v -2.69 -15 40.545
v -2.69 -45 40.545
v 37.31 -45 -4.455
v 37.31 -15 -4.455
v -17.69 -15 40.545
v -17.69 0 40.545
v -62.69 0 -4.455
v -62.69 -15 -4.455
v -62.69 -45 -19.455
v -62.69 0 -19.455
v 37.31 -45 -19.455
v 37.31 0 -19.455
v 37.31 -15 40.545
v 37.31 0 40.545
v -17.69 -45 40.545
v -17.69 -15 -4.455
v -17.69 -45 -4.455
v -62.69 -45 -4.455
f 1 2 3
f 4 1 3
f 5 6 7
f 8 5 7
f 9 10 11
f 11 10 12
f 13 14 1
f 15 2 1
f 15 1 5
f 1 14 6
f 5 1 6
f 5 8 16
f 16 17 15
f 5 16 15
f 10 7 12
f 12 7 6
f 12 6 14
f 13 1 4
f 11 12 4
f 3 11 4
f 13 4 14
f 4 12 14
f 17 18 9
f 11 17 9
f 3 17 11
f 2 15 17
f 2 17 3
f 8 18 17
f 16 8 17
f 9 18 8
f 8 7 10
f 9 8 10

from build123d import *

# Parameters (mm, degrees)
F1_DEPTH = 45
F3_DEPTH = 30
F5_DEPTH = 30


with BuildPart() as f1:
    # F0 (on Front) → F1 (new body)
    with BuildSketch(Plane.XZ):
        Polygon((-17.689841, 40.544534), (-62.689841, -4.455466), (-62.689841, -19.455466), (37.310159, -19.455466), (37.310159, -4.455466), (37.310159, 40.544534), (-2.689841, 40.544534), align=None)
    extrude(amount=F1_DEPTH)

    # F2 (on face) → F3 (cut)
    with BuildSketch(Plane.XZ.offset(45)):
        Polygon((-17.689841, -4.455466), (-17.689841, 40.544534), (-62.689841, -4.455466), align=None)
    extrude(amount=-F3_DEPTH, mode=Mode.SUBTRACT)

    # F4 (on face) → F5 (cut)
    with BuildSketch(Plane.XZ.offset(45)):
        Polygon((37.310159, 40.544534), (-2.689841, 40.544534), (37.310159, -4.455466), align=None)
    extrude(amount=-F5_DEPTH, mode=Mode.SUBTRACT)


solid = f1.part
